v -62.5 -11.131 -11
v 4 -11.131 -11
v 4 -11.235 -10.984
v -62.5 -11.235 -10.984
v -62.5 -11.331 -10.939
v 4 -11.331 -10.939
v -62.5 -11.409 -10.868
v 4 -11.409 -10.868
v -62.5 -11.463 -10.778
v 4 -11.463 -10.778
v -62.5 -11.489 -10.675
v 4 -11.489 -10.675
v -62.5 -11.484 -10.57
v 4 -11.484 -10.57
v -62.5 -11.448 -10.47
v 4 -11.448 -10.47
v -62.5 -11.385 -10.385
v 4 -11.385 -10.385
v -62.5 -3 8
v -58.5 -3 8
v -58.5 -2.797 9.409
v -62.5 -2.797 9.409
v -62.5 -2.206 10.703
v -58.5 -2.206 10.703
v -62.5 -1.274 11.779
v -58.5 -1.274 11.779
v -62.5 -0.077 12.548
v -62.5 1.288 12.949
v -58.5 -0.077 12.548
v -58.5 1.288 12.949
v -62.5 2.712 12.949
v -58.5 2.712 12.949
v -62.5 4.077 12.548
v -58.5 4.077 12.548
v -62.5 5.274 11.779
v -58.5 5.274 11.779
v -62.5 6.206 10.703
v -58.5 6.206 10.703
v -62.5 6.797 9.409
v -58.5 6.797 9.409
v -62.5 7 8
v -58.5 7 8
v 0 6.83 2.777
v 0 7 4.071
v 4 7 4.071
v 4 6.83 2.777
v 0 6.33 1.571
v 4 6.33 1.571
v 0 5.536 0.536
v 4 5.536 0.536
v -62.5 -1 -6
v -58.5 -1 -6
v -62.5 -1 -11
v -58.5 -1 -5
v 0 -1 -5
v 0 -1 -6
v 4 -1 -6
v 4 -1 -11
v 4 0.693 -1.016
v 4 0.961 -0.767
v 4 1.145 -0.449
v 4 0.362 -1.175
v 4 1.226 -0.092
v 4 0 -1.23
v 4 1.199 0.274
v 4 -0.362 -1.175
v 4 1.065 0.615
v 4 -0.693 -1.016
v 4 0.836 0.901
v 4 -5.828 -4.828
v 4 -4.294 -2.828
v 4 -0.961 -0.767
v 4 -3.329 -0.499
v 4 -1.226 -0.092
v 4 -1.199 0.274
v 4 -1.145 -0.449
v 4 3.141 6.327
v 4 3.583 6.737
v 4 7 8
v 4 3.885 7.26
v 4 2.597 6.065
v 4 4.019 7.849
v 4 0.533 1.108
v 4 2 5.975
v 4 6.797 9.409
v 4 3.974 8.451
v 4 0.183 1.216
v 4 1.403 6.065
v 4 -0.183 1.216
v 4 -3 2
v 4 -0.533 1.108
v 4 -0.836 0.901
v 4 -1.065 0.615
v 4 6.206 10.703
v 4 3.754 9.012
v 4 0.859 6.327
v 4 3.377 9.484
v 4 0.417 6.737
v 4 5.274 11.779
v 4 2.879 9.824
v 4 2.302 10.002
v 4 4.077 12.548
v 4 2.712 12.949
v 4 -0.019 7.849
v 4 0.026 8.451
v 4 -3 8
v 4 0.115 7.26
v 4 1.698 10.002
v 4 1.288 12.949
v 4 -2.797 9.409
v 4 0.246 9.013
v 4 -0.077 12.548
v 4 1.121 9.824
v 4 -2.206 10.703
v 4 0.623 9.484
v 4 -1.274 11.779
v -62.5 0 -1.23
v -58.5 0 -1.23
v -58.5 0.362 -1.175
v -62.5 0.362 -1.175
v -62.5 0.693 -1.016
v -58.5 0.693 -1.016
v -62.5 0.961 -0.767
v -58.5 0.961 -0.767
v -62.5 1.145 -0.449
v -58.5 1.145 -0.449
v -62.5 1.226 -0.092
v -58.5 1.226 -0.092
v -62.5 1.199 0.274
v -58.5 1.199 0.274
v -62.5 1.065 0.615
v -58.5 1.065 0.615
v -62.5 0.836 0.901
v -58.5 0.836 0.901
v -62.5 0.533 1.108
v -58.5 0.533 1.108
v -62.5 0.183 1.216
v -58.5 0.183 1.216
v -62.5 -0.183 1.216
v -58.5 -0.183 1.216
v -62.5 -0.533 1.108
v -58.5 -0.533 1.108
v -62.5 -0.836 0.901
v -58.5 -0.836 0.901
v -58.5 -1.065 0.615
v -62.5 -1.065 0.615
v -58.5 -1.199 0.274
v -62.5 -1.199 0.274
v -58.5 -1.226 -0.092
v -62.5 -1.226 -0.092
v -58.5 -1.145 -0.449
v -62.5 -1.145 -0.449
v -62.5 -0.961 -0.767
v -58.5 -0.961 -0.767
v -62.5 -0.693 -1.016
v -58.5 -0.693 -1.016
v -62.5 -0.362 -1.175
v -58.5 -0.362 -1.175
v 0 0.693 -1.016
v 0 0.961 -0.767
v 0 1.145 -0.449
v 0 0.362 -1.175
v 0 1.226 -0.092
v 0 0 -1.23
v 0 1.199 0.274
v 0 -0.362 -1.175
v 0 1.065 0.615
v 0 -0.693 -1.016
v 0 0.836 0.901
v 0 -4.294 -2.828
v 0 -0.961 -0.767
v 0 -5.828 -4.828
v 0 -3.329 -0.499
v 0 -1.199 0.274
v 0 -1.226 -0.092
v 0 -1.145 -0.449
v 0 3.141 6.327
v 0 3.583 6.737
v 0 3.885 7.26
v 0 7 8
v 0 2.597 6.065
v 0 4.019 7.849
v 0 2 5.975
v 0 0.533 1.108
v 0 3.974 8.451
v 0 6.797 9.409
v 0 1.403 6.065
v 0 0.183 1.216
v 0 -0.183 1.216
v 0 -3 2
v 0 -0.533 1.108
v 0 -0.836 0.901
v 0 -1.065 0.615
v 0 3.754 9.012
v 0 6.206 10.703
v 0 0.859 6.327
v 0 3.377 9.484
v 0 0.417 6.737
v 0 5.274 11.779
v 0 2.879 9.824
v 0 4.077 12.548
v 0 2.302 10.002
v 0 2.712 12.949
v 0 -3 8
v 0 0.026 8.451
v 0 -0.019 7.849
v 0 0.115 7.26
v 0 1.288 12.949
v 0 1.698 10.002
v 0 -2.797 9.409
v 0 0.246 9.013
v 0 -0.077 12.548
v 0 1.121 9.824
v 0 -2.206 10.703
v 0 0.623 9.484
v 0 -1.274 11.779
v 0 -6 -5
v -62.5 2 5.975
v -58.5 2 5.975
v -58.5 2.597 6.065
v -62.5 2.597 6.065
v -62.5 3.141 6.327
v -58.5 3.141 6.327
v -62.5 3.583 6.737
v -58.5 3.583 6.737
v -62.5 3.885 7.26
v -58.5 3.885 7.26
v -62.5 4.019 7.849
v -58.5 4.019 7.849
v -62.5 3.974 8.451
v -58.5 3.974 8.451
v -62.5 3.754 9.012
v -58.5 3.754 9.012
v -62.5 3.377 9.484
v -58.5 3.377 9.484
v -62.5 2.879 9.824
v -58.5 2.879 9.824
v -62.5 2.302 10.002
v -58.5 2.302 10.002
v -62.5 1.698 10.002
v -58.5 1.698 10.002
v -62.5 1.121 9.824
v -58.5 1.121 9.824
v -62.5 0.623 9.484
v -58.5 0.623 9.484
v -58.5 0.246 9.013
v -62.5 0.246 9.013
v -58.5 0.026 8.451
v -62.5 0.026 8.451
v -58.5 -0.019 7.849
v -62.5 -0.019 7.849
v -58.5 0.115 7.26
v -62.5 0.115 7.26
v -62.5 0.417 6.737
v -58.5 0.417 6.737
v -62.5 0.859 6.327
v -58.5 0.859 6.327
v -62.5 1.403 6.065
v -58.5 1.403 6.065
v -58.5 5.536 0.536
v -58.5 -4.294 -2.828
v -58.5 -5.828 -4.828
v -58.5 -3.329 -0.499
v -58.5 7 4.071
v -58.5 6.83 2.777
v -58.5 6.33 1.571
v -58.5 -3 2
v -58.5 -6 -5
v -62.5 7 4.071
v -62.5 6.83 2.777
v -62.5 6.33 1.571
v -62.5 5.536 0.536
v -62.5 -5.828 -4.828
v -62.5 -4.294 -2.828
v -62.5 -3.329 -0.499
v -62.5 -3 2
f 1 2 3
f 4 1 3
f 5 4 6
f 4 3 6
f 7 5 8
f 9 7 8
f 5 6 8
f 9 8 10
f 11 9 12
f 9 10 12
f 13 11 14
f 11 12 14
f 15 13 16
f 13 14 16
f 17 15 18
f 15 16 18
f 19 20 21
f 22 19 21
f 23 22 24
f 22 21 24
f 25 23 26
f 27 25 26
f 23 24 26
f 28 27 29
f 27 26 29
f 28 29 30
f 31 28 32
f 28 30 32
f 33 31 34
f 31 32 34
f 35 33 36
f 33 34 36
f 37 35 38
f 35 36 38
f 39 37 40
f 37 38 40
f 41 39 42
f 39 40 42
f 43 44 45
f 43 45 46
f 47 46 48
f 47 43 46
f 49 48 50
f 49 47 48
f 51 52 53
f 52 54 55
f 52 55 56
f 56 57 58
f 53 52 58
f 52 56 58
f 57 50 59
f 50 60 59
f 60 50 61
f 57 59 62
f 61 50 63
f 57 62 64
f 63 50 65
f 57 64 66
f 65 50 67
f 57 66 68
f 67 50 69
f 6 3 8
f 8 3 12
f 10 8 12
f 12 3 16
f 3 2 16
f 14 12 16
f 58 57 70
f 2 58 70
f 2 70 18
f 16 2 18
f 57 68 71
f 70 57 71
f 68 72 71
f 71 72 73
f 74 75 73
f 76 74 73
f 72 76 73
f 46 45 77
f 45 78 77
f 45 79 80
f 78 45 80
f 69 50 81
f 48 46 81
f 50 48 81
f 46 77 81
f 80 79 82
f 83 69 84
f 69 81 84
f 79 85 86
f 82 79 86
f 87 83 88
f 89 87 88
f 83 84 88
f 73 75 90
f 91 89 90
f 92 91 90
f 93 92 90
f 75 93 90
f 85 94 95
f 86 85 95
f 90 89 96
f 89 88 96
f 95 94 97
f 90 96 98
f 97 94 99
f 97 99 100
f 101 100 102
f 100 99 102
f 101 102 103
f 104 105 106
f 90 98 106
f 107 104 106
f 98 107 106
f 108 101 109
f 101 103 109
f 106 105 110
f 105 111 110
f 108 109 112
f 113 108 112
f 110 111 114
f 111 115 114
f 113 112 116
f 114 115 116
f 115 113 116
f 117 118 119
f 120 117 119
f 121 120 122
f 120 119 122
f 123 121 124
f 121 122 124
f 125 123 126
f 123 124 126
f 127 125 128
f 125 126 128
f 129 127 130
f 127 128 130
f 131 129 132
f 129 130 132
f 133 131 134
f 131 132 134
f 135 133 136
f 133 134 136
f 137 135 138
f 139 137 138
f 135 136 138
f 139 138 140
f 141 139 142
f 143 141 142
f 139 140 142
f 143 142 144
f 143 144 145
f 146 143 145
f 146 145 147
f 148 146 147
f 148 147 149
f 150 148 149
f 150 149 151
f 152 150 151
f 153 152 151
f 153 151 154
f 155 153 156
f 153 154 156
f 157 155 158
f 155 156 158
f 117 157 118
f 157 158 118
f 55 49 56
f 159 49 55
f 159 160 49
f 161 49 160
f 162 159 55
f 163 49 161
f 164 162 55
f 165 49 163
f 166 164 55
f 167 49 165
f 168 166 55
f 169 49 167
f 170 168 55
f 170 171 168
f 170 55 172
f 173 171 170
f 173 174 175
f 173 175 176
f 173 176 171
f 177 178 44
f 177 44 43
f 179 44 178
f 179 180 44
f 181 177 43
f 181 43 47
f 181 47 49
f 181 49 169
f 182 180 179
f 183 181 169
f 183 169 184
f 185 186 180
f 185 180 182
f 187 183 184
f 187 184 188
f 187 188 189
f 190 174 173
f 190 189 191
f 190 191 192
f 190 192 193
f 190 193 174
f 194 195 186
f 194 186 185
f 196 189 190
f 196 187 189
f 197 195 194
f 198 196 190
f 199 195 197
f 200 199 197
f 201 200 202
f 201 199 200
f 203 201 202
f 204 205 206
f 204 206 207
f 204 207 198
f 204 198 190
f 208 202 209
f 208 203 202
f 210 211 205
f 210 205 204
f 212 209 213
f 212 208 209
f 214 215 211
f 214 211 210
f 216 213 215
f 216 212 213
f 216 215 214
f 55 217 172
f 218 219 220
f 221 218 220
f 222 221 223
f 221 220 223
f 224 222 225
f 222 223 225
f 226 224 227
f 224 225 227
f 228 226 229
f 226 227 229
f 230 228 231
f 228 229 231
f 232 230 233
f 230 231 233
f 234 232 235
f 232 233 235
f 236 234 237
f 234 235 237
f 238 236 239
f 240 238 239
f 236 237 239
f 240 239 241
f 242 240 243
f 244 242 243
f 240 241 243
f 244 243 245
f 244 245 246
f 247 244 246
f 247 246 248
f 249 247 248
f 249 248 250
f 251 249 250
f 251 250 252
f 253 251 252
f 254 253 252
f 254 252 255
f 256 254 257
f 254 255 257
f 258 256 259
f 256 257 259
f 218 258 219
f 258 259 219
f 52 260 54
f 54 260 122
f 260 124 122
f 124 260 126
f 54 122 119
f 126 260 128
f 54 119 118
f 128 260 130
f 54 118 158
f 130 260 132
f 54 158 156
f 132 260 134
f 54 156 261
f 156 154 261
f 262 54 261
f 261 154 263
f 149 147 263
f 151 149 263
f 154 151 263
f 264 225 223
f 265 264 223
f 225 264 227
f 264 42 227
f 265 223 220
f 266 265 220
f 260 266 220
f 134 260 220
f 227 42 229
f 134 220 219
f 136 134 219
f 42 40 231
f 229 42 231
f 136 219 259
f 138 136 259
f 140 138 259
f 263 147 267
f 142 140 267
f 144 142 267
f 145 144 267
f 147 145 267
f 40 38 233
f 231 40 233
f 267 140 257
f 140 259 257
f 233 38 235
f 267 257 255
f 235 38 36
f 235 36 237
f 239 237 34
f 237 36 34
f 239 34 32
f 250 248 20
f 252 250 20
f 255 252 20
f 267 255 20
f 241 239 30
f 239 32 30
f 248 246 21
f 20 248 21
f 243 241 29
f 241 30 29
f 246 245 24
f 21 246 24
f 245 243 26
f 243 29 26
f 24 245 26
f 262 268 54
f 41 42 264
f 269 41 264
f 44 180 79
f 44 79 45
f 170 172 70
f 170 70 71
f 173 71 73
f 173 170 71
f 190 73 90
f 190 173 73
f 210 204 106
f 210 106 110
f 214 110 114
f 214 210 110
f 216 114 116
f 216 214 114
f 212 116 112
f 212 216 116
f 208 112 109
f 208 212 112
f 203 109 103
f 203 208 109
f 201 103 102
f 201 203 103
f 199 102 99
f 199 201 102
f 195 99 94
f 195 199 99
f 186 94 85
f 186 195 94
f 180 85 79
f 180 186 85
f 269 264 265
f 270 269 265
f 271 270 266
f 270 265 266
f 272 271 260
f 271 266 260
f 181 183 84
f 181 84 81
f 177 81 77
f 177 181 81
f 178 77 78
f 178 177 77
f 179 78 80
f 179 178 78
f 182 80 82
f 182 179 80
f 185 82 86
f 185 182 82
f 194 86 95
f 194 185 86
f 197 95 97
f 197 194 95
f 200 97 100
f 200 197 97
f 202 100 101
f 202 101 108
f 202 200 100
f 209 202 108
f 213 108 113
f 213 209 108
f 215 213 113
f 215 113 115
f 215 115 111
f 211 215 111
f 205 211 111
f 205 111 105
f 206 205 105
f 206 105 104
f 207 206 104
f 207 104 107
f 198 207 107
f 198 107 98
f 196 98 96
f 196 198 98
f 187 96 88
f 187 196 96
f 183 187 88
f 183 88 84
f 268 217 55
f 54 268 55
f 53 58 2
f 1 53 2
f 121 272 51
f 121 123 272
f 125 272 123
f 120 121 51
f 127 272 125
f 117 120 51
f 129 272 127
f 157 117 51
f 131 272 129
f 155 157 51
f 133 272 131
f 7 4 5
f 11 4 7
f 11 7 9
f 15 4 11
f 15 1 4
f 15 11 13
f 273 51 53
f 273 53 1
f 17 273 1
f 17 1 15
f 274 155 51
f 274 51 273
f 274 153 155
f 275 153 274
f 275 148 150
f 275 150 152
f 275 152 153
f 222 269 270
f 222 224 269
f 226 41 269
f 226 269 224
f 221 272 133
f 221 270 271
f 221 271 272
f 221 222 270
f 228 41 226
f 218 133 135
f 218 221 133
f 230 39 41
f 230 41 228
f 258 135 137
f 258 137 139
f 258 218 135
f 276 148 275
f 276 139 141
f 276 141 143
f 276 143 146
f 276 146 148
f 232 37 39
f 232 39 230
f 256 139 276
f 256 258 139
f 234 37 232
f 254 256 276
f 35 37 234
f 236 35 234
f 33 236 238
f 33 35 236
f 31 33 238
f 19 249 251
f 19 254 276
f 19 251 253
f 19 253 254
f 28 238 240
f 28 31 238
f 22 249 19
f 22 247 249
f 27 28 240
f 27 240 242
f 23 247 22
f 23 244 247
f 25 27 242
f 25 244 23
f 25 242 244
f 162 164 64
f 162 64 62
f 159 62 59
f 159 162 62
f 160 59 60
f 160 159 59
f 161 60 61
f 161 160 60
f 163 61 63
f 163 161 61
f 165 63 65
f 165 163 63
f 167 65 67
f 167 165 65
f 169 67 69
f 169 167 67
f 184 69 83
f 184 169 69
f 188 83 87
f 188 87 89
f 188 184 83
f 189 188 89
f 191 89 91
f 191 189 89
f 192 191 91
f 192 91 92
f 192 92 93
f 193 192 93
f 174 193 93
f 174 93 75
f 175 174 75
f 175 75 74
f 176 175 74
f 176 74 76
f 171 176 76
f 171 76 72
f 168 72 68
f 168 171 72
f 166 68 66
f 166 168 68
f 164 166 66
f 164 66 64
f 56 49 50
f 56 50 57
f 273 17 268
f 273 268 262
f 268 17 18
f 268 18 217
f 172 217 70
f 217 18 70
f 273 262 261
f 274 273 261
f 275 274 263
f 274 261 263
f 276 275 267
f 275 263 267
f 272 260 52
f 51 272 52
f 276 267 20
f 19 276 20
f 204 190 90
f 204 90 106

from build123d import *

# Parameters (mm, degrees)
SKETCH1_R           = 2.025
SKETCH1_R_2         = 1.2295
BOSS_EXTRUDE1_DEPTH = 4
BOSS_EXTRUDE3_START = 29.25
BOSS_EXTRUDE3_DEPTH = 29.25


with BuildPart() as part:
    # Sketch1 → Boss-Extrude1 (new body)
    with BuildSketch(Plane.YZ):
        with BuildLine():
            Line((-11.385441559, -10.385441559), (-5.828427125, -4.828427125))
            ThreePointArc((-5.828427125, -4.828427125), (-3.73508426, -1.69551813), (-3, 2))
            Line((-3, 2), (-3, 8))
            ThreePointArc((-3, 8), (2, 13), (7, 8))
            Line((7, 8), (7, 4.071067812))
            ThreePointArc((7, 4.071067812), (6.619397663, 2.15765065), (5.535533906, 0.535533906))
            Line((5.535533906, 0.535533906), (-1, -6))
            Line((-1, -6), (-1, -11))
            Line((-1, -11), (-11.130883118, -11))
            ThreePointArc((-11.130883118, -11), (-11.463479749, -10.777766036), (-11.385441559, -10.385441559))
        make_face()
        with Locations(Location((2, 8, 0), (0, 0, 270))):
            Circle(SKETCH1_R, mode=Mode.SUBTRACT)
        with Locations(Location((0, 0, 0), (0, 0, 270))):
            Circle(SKETCH1_R_2, mode=Mode.SUBTRACT)
    boss_extrude1 = extrude(amount=BOSS_EXTRUDE1_DEPTH)

    # Sketch4 → Boss-Extrude3 (add)
    with BuildSketch(Plane(origin=(0, 0, 0), x_dir=(0, -1, 0), z_dir=(-1, 0, 0)).offset(BOSS_EXTRUDE3_START)):
        with BuildLine():
            Line((1, -6), (1, -11))
            Line((1, -11), (11.130883118, -11))
            ThreePointArc((11.130883118, -11), (11.463479749, -10.777766036), (11.385441559, -10.385441559))
            Line((11.385441559, -10.385441559), (7, -6))
            Line((7, -6), (6, -5))
            Line((6, -5), (1, -5))
            Line((1, -5), (1, -6))
        make_face()
    boss_extrude3 = extrude(amount=-BOSS_EXTRUDE3_DEPTH)

    # Mirror8: Boss-Extrude3 across plane
    add(boss_extrude3.mirror(Plane(origin=(-29.25, 0, 0), x_dir=(0, 0, 1), z_dir=(1, 0, 0))))

    # Mirror9: Boss-Extrude1 across plane
    add(boss_extrude1.mirror(Plane(origin=(-29.25, 0, 0), x_dir=(0, 0, 1), z_dir=(1, 0, 0))))


solid = part.part
